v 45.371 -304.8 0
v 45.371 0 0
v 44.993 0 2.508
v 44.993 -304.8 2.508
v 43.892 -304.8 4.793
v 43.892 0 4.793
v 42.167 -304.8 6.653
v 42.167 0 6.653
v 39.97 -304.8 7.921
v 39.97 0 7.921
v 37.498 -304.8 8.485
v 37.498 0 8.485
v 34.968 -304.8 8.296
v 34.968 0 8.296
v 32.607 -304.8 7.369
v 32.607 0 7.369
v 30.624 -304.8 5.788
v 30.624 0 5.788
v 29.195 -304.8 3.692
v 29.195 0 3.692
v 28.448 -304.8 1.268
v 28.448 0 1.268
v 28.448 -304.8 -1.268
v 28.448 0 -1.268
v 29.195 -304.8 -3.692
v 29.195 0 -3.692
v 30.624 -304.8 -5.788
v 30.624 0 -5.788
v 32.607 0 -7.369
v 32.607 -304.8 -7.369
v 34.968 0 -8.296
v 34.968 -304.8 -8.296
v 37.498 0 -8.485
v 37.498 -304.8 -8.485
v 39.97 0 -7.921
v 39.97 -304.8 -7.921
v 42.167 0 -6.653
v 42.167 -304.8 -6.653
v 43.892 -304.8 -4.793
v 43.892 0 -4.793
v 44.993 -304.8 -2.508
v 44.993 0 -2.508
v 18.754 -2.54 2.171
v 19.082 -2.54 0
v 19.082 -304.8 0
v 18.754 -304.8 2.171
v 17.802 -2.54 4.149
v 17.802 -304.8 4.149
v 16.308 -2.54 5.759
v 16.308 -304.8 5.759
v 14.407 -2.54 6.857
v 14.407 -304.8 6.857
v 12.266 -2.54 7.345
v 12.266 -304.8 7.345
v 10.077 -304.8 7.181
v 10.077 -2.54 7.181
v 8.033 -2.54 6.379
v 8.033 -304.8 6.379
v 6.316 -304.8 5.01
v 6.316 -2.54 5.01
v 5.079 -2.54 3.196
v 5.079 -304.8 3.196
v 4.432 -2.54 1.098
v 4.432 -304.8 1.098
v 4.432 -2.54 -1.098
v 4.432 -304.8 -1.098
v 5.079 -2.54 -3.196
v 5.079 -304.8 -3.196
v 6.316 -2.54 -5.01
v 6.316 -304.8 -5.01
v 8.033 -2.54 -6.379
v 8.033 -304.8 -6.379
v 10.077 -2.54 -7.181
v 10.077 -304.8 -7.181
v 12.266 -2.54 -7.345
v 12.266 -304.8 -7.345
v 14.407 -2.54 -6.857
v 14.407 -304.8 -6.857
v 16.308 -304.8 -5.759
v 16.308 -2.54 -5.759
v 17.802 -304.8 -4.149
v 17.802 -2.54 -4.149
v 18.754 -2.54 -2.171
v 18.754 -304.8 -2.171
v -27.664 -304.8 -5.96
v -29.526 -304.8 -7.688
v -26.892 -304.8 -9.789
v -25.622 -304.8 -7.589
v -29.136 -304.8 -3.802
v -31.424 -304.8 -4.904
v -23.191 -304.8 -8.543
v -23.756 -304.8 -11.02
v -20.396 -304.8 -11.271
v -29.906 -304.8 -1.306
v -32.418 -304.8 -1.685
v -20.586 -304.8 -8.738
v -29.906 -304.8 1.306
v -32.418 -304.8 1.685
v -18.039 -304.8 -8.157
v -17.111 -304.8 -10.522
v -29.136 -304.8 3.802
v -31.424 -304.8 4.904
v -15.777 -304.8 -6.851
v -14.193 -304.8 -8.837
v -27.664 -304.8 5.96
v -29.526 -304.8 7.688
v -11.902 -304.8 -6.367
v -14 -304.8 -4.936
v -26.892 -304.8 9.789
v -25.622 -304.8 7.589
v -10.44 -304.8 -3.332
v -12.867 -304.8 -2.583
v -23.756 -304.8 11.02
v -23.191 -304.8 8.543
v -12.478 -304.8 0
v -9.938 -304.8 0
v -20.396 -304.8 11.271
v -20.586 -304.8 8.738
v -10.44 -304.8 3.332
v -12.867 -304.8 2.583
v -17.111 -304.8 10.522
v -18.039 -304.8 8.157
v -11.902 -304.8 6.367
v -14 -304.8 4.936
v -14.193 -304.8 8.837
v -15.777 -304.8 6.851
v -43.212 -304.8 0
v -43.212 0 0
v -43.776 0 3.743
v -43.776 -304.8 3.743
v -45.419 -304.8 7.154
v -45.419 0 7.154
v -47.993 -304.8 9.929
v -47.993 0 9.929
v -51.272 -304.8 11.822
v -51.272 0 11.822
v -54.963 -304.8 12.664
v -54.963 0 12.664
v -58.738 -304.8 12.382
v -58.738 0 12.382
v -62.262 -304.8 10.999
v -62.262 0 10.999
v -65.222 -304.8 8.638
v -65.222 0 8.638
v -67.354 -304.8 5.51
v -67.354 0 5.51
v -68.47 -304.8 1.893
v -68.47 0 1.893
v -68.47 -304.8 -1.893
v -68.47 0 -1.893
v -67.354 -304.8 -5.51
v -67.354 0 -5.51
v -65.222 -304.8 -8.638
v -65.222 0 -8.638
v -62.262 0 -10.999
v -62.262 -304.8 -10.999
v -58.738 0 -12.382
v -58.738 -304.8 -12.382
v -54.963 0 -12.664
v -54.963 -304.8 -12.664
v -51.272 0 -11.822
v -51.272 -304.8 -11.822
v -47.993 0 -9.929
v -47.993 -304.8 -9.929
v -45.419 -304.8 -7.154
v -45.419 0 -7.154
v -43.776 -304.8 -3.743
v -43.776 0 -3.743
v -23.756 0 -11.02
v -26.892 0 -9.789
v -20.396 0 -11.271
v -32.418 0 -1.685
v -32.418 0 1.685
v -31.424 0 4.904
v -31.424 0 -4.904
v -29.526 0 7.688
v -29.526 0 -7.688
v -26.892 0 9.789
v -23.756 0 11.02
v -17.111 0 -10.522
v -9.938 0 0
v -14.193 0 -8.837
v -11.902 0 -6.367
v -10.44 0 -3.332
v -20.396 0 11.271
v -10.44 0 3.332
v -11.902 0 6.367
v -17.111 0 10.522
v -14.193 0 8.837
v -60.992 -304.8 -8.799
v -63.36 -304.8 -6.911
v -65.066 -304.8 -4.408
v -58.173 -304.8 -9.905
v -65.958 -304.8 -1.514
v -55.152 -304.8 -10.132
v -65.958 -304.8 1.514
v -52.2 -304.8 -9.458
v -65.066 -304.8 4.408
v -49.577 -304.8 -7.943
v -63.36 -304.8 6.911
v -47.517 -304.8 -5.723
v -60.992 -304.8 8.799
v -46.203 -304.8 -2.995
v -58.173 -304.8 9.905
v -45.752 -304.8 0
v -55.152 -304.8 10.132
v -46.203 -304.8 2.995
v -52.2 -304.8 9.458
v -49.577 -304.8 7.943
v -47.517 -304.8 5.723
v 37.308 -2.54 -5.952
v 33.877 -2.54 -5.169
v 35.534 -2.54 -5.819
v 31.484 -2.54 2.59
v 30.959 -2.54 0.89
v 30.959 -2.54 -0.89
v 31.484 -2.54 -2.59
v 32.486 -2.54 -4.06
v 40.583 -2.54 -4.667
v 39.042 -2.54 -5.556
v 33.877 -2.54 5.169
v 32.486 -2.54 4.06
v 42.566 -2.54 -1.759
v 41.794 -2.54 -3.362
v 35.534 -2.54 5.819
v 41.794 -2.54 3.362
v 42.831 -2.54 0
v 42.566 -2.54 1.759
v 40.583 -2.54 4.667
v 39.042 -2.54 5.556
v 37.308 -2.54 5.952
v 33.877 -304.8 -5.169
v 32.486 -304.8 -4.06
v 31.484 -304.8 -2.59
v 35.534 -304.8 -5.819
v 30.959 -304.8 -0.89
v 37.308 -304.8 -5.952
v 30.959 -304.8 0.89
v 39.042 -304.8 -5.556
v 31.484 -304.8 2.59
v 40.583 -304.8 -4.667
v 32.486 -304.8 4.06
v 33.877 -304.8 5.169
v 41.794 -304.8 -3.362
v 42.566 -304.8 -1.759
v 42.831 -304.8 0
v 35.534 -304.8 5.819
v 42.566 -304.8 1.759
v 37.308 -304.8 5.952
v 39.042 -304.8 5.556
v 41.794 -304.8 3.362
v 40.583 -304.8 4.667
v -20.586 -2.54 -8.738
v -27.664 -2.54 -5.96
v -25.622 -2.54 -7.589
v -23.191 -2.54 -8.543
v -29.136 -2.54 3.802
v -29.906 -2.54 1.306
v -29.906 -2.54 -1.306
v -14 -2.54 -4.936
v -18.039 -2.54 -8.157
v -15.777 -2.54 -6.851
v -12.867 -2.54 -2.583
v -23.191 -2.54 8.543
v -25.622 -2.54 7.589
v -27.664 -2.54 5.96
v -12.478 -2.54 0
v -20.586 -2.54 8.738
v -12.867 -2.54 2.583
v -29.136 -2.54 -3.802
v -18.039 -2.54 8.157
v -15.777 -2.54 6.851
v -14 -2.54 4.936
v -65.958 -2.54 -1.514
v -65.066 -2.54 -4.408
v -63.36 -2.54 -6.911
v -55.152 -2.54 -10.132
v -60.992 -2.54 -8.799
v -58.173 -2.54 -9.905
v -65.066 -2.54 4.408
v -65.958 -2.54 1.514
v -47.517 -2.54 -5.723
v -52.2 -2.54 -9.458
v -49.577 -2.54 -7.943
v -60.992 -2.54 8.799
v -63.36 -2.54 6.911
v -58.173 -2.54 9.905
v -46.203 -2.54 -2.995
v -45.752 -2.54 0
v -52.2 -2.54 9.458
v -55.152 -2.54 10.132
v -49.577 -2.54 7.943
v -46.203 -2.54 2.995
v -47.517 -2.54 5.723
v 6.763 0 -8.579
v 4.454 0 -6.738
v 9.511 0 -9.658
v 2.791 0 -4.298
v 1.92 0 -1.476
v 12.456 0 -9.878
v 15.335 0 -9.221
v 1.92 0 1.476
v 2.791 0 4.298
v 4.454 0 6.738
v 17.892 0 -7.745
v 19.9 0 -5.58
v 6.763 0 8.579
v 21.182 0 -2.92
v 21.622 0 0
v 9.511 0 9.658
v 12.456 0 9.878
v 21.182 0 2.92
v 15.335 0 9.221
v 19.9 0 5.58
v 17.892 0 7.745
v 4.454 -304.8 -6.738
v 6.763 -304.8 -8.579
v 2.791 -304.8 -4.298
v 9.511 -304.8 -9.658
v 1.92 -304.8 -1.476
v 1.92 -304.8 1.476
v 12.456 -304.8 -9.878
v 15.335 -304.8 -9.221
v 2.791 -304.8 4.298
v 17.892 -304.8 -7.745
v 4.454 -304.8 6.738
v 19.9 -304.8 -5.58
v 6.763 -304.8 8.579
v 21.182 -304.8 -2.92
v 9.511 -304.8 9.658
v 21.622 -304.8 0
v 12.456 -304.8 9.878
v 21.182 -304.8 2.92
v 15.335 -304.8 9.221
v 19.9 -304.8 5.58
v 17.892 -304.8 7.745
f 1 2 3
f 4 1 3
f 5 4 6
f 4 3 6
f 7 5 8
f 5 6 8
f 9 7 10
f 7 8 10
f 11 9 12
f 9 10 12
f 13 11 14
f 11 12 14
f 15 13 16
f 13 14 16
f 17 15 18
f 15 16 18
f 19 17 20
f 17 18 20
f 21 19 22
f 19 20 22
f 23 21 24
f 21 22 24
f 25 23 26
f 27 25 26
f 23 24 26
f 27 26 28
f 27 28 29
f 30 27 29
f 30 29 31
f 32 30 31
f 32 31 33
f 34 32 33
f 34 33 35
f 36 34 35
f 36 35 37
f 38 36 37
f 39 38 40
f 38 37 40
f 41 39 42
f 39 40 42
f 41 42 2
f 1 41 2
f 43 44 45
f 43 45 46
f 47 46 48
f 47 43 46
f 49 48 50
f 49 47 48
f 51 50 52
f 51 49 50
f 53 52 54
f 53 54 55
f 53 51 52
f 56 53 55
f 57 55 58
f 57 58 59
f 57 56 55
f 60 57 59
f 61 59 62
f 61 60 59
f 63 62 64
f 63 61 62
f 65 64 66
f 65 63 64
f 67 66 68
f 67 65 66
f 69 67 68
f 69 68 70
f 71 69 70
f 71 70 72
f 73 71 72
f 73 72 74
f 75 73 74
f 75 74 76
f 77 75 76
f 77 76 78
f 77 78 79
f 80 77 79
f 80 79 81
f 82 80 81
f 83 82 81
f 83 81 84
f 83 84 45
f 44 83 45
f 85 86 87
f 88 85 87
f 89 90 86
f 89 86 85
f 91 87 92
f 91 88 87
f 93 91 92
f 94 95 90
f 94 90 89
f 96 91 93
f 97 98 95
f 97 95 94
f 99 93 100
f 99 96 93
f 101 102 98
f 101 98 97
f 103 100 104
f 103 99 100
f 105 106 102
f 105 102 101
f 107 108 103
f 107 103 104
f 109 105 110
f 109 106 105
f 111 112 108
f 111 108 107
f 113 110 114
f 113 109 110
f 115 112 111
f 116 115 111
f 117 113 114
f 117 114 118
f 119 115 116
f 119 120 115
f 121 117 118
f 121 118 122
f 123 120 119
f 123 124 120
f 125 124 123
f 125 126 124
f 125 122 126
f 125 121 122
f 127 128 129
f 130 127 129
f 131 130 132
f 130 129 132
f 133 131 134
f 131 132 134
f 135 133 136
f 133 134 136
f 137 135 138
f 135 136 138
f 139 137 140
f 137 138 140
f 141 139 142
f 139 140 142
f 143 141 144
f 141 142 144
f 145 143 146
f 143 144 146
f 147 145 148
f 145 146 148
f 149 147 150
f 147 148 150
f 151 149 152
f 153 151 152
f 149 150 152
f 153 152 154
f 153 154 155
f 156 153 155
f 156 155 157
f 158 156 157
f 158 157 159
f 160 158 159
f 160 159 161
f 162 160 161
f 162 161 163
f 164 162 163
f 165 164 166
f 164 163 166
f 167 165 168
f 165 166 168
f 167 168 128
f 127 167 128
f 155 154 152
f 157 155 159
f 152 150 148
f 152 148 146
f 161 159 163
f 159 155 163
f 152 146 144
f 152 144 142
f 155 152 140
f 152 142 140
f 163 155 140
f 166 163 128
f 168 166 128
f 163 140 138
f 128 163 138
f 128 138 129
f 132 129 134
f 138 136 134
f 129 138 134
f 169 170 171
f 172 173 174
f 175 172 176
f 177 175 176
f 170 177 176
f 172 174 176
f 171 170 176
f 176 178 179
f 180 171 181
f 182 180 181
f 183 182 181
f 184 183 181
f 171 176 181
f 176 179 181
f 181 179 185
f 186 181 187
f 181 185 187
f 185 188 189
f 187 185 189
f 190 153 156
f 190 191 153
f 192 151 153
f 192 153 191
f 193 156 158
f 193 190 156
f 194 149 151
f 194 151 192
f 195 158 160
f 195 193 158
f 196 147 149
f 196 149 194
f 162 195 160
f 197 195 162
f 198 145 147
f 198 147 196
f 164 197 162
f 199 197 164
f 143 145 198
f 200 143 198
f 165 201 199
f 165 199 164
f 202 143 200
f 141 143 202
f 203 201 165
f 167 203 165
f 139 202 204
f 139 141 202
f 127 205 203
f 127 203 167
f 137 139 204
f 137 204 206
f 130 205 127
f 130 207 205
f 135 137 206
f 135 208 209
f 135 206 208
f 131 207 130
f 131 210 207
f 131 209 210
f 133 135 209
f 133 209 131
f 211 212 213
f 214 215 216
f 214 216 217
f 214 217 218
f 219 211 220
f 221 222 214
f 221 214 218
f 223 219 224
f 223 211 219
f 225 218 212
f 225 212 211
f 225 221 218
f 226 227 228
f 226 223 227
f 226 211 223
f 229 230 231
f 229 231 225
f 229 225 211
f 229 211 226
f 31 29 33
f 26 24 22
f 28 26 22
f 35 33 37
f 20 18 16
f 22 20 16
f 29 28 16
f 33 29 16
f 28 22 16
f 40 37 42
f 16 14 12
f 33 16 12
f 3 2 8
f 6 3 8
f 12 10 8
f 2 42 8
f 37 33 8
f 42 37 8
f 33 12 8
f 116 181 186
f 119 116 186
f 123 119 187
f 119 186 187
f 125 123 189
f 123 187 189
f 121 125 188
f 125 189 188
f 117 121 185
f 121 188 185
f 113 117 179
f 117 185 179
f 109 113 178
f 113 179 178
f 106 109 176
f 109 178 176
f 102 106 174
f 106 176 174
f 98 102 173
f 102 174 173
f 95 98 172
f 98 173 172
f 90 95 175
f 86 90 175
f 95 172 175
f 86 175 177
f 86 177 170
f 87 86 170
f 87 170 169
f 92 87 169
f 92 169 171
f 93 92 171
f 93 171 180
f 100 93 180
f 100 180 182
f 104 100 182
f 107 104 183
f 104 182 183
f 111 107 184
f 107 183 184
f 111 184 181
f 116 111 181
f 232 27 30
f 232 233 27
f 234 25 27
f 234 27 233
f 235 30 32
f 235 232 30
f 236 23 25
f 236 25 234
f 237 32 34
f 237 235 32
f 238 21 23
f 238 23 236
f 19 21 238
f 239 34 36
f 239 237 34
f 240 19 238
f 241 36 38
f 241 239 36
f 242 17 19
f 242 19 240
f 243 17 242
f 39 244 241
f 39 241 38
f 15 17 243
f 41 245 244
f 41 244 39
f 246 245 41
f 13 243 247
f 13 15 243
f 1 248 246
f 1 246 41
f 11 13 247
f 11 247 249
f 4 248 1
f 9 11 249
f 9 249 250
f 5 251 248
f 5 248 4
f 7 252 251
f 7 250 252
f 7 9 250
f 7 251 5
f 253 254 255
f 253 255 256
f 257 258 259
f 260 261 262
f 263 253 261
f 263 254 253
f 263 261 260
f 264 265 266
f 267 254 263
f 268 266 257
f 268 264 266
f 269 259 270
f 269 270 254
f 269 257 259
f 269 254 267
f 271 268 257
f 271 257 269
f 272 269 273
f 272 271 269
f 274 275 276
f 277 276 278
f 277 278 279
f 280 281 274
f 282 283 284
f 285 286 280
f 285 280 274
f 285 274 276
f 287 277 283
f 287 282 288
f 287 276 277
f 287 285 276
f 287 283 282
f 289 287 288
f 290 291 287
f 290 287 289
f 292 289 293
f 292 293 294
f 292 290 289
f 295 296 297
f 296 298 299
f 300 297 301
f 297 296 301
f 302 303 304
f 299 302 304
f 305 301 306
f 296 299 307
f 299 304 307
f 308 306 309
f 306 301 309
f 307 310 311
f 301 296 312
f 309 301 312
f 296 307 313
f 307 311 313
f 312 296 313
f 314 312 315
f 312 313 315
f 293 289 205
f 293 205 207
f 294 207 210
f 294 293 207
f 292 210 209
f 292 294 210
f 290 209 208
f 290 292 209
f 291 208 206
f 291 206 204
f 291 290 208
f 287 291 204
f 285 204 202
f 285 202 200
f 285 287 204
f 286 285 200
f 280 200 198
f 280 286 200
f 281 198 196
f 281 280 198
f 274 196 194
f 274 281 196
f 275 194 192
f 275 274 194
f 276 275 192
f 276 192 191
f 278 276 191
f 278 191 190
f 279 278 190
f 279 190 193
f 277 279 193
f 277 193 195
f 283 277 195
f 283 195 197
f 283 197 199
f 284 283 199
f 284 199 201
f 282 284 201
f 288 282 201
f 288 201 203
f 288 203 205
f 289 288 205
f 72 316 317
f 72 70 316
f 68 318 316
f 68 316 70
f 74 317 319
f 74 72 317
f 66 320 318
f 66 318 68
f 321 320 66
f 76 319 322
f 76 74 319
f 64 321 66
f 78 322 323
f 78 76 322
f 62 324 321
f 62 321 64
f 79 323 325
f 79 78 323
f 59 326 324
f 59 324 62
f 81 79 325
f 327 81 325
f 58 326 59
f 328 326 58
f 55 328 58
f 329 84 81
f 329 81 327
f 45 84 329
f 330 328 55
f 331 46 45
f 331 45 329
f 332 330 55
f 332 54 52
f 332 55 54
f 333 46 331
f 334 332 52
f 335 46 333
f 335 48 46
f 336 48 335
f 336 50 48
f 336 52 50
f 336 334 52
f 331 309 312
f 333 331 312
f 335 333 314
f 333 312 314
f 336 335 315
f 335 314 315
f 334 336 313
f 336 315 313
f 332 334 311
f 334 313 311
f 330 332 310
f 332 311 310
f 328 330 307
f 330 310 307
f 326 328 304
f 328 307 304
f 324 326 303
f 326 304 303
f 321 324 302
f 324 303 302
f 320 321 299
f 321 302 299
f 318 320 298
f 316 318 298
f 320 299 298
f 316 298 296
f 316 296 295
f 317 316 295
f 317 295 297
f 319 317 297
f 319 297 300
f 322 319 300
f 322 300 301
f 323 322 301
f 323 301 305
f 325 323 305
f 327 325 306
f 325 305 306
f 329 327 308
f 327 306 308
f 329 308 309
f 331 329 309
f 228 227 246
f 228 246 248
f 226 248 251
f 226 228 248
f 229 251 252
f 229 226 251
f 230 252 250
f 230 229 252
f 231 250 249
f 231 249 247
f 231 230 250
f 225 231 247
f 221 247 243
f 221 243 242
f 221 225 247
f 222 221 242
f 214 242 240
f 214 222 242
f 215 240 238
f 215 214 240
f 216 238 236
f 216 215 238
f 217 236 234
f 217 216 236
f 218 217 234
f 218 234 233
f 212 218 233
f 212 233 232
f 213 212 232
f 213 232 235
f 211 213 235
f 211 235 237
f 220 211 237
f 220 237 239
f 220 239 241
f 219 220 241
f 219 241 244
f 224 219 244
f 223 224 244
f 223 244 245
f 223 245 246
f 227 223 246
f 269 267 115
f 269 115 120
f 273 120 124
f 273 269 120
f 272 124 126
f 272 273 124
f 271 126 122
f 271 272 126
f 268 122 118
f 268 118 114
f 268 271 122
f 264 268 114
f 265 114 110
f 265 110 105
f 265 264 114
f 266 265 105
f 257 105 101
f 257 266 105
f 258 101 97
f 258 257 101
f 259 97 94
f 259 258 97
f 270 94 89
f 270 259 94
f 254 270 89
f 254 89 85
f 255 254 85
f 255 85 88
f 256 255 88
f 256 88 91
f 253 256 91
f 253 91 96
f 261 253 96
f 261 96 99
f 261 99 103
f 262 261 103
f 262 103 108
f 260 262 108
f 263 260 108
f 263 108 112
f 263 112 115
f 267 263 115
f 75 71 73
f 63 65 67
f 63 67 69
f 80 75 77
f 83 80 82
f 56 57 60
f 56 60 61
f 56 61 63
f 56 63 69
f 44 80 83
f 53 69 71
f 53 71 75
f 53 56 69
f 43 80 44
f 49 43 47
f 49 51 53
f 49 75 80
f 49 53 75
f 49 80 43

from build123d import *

# Parameters (mm, degrees)
F0_R     = 12.7
F0_R_2   = 10.16
F0_R_3   = 11.303
F0_R_4   = 8.763
F0_R_5   = 9.906
F0_R_6   = 7.366
F0_R_7   = 8.509
F0_R_8   = 5.969
F1_DEPTH = 304.8
F2_DEPTH = 2.54


with BuildPart() as f1:
    # F0 (on Front) → F1 (new body)
    with BuildSketch(Plane.XZ):
        with Locations((-55.91175, 0)):
            Circle(F0_R)
        with Locations((-55.91175, 0)):
            Circle(F0_R_2, mode=Mode.SUBTRACT)
        with Locations((-21.24075, 0)):
            Circle(F0_R_3)
        with Locations((-21.24075, 0)):
            Circle(F0_R_4, mode=Mode.SUBTRACT)
        with Locations((11.715749, 0)):
            Circle(F0_R_5)
        with Locations((11.715749, 0)):
            Circle(F0_R_6, mode=Mode.SUBTRACT)
        with Locations((36.861751, 0)):
            Circle(F0_R_7)
        with Locations((36.861751, 0)):
            Circle(F0_R_8, mode=Mode.SUBTRACT)
    extrude(amount=F1_DEPTH)

    # F0 (on Front) → F2 (join)
    with BuildSketch(Plane.XZ):
        with Locations((-55.91175, 0)):
            Circle(F0_R_2)
        with Locations((-21.24075, 0)):
            Circle(F0_R_4)
        with Locations((11.715749, 0)):
            Circle(F0_R_6)
        with Locations((36.861751, 0)):
            Circle(F0_R_8)
    extrude(amount=F2_DEPTH)


solid = f1.part
